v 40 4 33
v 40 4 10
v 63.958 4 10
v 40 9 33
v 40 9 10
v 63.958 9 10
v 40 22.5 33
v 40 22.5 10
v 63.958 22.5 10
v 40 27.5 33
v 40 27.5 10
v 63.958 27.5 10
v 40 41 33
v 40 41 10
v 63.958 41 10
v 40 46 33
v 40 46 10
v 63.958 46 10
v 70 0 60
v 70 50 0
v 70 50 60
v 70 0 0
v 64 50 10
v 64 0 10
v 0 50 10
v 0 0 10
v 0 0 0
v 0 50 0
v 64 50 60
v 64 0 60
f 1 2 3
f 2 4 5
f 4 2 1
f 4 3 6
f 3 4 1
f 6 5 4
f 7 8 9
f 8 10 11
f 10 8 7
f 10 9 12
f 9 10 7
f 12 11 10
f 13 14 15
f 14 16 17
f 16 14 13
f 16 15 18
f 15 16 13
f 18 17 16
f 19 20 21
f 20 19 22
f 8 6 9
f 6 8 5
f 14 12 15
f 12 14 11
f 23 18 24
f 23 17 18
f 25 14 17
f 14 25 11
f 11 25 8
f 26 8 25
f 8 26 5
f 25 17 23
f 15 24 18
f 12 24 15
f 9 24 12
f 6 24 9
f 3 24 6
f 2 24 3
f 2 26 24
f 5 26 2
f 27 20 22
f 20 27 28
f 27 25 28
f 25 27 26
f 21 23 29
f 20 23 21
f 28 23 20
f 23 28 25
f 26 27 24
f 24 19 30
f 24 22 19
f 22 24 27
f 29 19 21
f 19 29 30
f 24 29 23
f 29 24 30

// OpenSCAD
$fn = 32;

// ----------------------------------------------------------------------
// Rib bracket: 3-gusset L bracket
// ----------------------------------------------------------------------

// --- parameters (mm) ---
base_l = 70;              // foot length, X
base_w = 50;              // foot width, Y
base_t = 10;              // foot thickness
plate_t = 6;              // upright plate thickness
plate_h = 60;             // overall height
gus_l = 24;               // gusset leg along the foot
gus_h = 24;               // gusset height
gus_t = 5;                // gusset thickness
gus_edge = 4;             // gusset margin from the foot edge
n_gus = 3;                // gusset count

gus_pitch = (base_w - 2 * gus_edge - gus_t) / (n_gus - 1);  // gusset pitch

union() {
  cube([base_l, base_w, base_t]);
  translate([base_l - plate_t, 0, base_t - 1])
    cube([plate_t, base_w, plate_h - base_t + 1]);
  for (i = [0 : n_gus - 1])
    translate([base_l - plate_t - gus_l, gus_edge + i * gus_pitch, base_t - 1])
      rotate([-90, 0, 0])
        linear_extrude(height = gus_t)
          polygon(points = [[0, 0], [gus_l + 1, 0], [0, -gus_h]]);
}
